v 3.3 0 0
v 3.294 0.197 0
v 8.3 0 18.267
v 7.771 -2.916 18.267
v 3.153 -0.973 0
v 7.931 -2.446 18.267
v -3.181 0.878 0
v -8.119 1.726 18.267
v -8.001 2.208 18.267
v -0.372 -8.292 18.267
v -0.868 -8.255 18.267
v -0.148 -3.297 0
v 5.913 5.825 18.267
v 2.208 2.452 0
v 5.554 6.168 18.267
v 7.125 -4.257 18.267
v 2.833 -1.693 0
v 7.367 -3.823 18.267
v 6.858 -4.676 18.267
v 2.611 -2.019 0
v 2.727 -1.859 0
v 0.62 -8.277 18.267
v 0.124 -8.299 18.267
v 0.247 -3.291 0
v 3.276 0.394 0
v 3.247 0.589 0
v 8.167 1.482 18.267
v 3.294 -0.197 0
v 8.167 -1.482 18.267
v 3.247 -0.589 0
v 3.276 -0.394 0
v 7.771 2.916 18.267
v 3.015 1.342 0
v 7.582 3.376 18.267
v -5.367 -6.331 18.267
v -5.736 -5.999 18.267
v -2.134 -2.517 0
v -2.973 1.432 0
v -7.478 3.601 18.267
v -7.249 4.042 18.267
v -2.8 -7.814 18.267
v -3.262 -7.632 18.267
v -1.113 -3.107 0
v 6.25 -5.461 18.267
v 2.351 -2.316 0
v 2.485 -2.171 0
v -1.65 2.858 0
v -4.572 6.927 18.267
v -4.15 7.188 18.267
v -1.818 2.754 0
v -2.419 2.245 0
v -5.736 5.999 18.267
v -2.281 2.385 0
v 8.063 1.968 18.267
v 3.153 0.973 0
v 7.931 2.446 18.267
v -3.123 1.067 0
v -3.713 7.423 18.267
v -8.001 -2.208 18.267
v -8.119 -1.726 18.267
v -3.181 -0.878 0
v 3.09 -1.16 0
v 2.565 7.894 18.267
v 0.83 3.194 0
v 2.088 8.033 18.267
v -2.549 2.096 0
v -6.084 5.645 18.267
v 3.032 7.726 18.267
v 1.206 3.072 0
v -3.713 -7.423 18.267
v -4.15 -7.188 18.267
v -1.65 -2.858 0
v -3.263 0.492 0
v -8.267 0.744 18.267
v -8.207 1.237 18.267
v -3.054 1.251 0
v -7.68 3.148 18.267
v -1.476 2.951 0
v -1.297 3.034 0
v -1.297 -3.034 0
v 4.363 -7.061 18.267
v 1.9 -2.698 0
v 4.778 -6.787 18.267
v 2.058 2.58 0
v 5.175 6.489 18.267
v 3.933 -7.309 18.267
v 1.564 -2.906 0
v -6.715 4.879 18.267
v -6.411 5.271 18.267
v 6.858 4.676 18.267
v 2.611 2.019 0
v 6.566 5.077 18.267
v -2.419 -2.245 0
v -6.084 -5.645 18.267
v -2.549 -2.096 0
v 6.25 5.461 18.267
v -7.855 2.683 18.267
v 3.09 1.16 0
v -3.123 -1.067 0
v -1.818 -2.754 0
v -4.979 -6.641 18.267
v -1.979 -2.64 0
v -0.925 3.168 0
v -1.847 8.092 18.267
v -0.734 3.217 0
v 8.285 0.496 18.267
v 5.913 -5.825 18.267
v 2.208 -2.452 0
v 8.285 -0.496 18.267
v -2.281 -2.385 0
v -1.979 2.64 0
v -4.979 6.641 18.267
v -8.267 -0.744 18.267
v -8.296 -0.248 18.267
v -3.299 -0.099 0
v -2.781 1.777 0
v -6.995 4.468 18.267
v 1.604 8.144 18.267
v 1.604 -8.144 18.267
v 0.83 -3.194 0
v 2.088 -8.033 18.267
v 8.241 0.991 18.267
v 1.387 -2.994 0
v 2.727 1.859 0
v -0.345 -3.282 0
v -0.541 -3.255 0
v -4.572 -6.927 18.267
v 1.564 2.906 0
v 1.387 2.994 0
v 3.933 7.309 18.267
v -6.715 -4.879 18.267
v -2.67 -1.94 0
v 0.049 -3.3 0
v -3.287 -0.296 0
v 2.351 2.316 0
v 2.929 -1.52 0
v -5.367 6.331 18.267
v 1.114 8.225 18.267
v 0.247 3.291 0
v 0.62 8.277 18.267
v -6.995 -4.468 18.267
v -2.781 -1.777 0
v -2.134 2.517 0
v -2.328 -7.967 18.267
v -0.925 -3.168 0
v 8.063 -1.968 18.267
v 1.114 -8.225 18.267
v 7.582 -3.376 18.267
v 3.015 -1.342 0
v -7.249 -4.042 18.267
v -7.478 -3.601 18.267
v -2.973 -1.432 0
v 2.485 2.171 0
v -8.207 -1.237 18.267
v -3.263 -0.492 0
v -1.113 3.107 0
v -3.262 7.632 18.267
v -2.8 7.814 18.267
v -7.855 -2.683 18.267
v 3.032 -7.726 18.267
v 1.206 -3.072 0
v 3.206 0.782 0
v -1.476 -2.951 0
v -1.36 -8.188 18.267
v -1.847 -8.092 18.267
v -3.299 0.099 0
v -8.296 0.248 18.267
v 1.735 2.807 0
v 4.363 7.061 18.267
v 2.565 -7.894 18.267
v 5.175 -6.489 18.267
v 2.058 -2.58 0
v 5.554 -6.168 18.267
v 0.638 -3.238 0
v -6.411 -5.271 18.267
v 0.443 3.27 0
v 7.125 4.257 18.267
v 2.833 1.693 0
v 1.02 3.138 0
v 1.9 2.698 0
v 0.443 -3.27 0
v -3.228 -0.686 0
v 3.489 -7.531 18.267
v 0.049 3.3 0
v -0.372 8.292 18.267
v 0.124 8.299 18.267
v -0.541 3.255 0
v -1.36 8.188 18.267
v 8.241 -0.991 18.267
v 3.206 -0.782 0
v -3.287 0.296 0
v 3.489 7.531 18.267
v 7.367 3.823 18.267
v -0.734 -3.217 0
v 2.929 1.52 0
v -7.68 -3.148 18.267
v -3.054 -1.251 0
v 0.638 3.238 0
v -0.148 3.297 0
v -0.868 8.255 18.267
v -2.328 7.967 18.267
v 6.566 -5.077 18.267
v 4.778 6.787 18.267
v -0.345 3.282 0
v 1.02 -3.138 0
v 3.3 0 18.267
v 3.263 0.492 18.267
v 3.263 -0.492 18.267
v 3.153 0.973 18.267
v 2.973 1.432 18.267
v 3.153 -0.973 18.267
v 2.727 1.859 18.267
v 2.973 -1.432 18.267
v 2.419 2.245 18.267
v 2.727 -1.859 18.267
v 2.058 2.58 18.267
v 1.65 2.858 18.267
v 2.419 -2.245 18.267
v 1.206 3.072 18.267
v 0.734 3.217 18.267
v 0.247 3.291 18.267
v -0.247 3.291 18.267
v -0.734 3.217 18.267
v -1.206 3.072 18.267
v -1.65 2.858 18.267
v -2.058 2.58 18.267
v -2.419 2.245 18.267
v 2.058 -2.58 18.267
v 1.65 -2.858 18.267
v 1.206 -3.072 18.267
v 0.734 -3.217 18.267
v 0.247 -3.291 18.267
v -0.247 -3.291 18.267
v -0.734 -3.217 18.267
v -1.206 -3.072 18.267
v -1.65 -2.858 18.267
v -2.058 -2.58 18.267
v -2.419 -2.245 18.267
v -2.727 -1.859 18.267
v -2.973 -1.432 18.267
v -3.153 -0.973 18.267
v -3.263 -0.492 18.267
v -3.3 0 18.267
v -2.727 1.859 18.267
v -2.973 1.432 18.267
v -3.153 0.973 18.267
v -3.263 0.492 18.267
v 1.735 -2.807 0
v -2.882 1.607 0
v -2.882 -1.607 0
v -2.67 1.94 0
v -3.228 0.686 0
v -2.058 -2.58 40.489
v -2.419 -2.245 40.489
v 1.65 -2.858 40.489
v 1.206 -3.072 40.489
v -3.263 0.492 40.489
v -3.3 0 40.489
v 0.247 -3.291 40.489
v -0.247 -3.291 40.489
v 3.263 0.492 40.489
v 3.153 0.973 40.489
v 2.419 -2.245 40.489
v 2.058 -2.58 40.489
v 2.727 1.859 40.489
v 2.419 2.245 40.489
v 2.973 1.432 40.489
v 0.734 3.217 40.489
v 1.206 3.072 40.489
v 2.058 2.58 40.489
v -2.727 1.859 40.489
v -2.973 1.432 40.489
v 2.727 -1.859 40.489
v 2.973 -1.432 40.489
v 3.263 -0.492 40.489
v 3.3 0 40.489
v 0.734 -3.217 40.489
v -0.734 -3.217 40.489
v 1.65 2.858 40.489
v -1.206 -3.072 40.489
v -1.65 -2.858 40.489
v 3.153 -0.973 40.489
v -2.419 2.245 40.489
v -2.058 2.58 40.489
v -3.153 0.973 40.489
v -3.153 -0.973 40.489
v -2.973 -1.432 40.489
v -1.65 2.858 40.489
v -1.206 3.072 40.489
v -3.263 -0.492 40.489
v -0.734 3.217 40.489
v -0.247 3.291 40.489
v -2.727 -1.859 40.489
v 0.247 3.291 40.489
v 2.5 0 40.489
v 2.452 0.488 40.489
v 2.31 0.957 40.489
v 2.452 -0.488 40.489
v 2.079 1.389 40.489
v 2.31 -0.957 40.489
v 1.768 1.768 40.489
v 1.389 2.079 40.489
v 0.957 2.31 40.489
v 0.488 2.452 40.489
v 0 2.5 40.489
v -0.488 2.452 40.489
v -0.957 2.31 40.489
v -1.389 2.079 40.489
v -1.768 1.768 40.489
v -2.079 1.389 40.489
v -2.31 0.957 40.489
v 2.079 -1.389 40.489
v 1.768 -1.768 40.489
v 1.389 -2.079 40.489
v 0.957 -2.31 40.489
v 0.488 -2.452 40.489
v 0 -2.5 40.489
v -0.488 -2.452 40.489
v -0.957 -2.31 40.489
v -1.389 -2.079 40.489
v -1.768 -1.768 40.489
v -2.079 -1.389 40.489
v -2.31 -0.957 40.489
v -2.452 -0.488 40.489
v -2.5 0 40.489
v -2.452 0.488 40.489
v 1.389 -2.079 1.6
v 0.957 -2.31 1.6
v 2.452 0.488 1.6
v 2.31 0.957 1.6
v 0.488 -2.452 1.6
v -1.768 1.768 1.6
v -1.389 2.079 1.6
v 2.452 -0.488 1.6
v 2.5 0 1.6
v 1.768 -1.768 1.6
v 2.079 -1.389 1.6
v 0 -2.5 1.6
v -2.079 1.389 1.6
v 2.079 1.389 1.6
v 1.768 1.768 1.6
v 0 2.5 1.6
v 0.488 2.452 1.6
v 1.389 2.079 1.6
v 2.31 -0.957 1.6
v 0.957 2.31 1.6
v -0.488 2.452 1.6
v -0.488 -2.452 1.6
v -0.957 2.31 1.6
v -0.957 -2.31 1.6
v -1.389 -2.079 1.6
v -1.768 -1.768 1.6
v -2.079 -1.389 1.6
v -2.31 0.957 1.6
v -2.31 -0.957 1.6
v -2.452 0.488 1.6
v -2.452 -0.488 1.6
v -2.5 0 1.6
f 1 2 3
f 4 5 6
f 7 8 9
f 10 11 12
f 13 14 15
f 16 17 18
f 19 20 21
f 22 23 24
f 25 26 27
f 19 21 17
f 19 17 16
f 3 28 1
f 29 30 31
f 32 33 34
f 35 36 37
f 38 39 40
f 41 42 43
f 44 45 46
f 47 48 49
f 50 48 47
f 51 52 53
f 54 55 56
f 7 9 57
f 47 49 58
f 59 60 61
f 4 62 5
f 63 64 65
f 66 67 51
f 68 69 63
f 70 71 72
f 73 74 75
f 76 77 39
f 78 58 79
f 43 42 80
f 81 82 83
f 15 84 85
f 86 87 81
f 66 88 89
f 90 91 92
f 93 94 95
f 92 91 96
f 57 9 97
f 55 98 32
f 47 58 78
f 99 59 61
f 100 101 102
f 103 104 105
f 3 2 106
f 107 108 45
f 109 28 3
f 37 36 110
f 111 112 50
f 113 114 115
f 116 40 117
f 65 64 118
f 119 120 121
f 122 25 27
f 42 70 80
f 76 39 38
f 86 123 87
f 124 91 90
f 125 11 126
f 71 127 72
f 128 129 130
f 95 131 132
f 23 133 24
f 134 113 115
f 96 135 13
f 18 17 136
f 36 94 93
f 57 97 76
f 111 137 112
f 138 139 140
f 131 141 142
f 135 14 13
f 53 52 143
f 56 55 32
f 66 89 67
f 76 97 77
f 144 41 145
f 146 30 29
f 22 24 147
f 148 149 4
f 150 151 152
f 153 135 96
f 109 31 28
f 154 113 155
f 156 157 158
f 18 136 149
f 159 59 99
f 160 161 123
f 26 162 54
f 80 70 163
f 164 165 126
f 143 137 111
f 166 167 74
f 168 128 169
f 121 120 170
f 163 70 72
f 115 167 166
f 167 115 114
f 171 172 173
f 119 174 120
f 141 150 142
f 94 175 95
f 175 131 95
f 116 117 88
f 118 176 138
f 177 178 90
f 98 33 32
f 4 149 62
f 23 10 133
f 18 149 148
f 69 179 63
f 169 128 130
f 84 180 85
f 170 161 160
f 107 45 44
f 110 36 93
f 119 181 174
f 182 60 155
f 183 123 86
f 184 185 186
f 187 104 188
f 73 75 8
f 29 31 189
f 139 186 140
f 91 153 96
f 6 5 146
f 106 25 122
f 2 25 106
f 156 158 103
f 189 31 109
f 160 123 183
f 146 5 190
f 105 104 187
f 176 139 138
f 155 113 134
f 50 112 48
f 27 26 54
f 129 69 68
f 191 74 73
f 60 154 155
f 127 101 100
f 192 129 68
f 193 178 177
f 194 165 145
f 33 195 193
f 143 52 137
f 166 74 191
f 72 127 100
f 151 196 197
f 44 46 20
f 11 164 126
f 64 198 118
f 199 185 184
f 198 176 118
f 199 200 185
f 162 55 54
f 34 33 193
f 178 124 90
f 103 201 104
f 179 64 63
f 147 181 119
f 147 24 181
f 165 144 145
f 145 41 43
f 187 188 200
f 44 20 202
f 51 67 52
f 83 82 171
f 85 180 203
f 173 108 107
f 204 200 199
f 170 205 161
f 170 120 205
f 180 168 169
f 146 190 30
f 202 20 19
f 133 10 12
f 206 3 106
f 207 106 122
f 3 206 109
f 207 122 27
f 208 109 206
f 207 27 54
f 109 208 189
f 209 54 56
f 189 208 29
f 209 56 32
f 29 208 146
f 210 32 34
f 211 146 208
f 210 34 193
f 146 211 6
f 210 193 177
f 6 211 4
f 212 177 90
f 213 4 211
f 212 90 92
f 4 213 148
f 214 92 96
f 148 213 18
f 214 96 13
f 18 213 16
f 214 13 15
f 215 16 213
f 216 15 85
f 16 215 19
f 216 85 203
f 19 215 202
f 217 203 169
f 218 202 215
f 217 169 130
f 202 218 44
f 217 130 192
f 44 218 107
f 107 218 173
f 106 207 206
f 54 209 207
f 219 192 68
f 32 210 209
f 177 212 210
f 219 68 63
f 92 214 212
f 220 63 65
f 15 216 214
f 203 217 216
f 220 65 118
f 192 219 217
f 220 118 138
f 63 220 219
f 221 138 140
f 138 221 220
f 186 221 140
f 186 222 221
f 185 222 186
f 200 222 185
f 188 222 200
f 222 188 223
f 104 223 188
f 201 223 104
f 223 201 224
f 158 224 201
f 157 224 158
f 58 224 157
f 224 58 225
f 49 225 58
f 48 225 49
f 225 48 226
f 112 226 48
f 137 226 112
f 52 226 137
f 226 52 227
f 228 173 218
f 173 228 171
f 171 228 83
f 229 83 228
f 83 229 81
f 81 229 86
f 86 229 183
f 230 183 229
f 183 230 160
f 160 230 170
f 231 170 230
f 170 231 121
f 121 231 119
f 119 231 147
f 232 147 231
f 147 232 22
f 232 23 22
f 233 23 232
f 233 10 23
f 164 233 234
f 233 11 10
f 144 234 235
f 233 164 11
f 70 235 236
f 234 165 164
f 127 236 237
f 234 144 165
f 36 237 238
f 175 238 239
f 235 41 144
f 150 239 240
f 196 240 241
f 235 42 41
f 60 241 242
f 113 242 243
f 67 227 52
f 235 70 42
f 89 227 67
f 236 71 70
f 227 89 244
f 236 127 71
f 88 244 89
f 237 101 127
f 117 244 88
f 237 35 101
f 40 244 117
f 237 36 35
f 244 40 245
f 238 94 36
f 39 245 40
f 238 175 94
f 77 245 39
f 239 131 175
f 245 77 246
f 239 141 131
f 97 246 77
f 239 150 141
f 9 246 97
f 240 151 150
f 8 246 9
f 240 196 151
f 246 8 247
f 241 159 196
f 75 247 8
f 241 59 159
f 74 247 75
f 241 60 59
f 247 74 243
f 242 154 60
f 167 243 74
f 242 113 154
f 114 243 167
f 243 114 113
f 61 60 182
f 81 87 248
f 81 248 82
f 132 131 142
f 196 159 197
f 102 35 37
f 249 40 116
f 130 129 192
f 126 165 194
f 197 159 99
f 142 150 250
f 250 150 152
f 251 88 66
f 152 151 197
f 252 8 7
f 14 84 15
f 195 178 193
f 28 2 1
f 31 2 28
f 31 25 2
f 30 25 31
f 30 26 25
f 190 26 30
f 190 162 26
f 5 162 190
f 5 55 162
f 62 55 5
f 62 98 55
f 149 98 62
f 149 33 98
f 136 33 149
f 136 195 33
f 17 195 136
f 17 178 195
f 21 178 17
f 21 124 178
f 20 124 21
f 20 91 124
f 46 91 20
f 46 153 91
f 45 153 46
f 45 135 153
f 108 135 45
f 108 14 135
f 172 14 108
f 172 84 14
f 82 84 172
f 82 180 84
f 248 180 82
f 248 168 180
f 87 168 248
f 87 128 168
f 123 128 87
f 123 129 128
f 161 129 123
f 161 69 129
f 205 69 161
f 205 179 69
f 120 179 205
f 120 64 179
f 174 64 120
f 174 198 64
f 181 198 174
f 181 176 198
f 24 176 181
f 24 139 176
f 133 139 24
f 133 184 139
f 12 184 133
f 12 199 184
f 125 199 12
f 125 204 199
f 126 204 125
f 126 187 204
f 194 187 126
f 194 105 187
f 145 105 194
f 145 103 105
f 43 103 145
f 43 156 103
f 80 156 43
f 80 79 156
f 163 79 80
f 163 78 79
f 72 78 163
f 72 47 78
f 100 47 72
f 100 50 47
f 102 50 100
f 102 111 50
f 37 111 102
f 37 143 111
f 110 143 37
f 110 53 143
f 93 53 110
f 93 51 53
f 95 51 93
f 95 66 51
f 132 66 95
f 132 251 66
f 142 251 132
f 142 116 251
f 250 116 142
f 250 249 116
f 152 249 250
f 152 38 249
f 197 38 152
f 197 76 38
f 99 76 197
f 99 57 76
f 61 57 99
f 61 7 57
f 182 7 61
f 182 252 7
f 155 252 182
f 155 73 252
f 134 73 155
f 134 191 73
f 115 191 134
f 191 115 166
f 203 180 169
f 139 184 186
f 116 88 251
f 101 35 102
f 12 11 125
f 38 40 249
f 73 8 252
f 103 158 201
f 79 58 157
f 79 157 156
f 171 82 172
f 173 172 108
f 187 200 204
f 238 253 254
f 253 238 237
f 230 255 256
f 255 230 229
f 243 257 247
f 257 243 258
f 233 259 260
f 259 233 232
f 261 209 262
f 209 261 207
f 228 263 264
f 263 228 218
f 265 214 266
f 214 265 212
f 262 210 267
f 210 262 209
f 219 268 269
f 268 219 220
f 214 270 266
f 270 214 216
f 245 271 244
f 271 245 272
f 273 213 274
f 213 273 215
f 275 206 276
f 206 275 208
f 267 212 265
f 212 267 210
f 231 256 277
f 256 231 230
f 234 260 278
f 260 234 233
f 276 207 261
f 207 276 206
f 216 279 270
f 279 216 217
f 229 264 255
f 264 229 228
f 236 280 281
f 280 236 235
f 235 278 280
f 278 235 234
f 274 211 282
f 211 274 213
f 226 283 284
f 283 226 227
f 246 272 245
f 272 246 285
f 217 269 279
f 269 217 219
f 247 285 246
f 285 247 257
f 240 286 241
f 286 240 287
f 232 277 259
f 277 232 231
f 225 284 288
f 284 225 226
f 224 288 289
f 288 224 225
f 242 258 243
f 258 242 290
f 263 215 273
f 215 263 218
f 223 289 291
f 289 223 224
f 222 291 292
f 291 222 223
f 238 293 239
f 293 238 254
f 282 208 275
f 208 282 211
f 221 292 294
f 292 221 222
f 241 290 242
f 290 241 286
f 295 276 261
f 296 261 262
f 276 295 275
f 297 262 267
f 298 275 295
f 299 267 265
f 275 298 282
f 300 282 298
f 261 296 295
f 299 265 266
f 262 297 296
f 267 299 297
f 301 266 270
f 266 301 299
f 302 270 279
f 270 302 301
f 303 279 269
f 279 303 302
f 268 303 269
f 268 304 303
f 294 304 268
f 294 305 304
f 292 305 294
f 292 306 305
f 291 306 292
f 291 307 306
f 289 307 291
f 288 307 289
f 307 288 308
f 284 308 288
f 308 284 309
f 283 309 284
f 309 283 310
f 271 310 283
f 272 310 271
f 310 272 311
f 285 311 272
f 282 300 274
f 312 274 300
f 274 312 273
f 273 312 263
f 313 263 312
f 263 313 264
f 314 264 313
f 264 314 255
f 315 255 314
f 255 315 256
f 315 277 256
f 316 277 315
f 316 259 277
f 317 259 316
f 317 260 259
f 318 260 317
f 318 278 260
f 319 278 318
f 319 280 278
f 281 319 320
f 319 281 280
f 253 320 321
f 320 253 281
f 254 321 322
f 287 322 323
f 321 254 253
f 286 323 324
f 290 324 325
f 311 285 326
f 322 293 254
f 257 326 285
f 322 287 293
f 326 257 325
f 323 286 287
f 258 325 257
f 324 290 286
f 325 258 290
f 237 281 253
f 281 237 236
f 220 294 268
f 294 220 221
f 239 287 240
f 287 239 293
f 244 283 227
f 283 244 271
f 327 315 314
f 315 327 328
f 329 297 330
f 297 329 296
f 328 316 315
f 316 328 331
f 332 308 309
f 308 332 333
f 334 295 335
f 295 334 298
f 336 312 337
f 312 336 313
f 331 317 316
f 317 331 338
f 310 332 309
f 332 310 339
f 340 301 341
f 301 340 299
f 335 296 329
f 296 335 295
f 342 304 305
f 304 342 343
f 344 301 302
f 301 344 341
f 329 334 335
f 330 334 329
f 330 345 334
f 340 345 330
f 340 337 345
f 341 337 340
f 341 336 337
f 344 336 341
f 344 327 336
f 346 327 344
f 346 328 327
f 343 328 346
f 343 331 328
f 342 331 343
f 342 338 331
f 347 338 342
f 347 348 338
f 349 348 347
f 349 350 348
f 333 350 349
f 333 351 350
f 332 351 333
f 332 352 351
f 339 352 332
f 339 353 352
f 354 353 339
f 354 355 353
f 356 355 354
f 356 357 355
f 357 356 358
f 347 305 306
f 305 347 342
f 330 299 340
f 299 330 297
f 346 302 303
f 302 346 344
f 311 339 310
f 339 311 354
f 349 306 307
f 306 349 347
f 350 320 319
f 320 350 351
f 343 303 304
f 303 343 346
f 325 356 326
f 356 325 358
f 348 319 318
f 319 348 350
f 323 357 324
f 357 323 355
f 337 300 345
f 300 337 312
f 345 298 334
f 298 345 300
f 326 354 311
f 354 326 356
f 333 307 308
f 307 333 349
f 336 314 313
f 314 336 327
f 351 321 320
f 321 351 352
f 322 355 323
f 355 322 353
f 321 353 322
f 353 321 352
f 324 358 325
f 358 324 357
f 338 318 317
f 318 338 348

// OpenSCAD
$fa=1/1;
$fs=1/2;
bissl=1/2;
part="spool";//[spool,cap,hammer,all]
total_length=50;
wall=0.8;
air=0.5;
copper_height=5;
thick_wall=2*wall; //can be specified
iron_d=4;
iron_h=total_length/3; //can be changed, but this seems optimal
spool_h=iron_h; //according to theory, optimum is a little more
iron_travel=iron_h; //may be smaller with heavy beaters or returning springs
extra_hold=iron_h/3;
spool_id=iron_d+2*air;
spool_od=spool_id+2*wall;
cap_od=spool_od+2*copper_height;
slit=15;
hole=3;
hammer_flat=true;
module spool() {
  difference() {
    union() {
      cylinder(d1=spool_od,d2=cap_od,h=thick_wall+iron_travel);
      translate([0,0,iron_travel+thick_wall]) cylinder(d=spool_od,h=spool_h+extra_hold);
    }
    translate([0,0,thick_wall]) cylinder(d=spool_id,h=spool_h+iron_h+bissl+extra_hold);
  }
}
module cap() {
difference() {
union() {
cylinder(d=cap_od,h=thick_wall);
translate([0,0,thick_wall])cylinder(d=spool_od+2*wall+2*air,h=extra_hold);
translate([-cap_od/2,0,0])cube([cap_od,cap_od/2,thick_wall]);
translate([-cap_od/2,cap_od/2,0])cube([cap_od,thick_wall,2*thick_wall+slit]);
translate([-thick_wall/2,0,0])cube([thick_wall,cap_od/2,extra_hold+thick_wall]);
}
translate([0,0,-bissl])cylinder(d=spool_id,h=extra_hold+thick_wall+2*bissl);
cylinder(d=spool_od+2*air,h=extra_hold);
hull() {
translate([cap_od/2-thick_wall-hole/2,cap_od/2+thick_wall/2,2*thick_wall+hole/2])rotate([90,0,0])cylinder (d=hole, h=thick_wall+bissl,center=true);
translate([cap_od/2-thick_wall-hole/2,cap_od/2+thick_wall/2,slit])rotate([90,0,0])cylinder (d=hole, h=thick_wall+bissl,center=true);
}
hull() {
translate([-cap_od/2+thick_wall+hole/2,cap_od/2+thick_wall/2,2*thick_wall+hole/2])rotate([90,0,0])cylinder (d=hole, h=thick_wall+bissl,center=true);
translate([-cap_od/2+thick_wall+hole/2,cap_od/2+thick_wall/2,slit])rotate([90,0,0])cylinder (d=hole, h=thick_wall+bissl,center=true);
}
}
}
echo (cap_od-thick_wall*2-hole);
module hammer() {
if (hammer_flat) {
cylinder(d=cap_od-2*air,h=thick_wall);
translate([0,0,thick_wall]) cylinder(d1=cap_od-2*air,d2=iron_d,h=cap_od/2-iron_d/2-air/2);
}
else {
cylinder(d2=cap_od/2,d1=iron_d,h=cap_od/4-iron_d/4);
translate([0,0,cap_od/4-iron_d/4])cylinder(d=cap_od/2,h=thick_wall);
translate([0,0,cap_od/4-iron_d/4+thick_wall]) cylinder(d1=cap_od/2,d2=iron_d,h=cap_od/4-iron_d/4);
}
translate([0,0,thick_wall+cap_od/2-iron_d/2-air/2]) cylinder(d=iron_d,h=1.5*iron_h);
}
if (part=="all") {
spool();
translate([0,0,spool_h+iron_h+bissl+air+thick_wall])cap();
translate([0,0,total_length])mirror([0,0,1])hammer();
}
if (part=="spool") spool();
if (part=="cap") cap();
if (part=="hammer") hammer();
